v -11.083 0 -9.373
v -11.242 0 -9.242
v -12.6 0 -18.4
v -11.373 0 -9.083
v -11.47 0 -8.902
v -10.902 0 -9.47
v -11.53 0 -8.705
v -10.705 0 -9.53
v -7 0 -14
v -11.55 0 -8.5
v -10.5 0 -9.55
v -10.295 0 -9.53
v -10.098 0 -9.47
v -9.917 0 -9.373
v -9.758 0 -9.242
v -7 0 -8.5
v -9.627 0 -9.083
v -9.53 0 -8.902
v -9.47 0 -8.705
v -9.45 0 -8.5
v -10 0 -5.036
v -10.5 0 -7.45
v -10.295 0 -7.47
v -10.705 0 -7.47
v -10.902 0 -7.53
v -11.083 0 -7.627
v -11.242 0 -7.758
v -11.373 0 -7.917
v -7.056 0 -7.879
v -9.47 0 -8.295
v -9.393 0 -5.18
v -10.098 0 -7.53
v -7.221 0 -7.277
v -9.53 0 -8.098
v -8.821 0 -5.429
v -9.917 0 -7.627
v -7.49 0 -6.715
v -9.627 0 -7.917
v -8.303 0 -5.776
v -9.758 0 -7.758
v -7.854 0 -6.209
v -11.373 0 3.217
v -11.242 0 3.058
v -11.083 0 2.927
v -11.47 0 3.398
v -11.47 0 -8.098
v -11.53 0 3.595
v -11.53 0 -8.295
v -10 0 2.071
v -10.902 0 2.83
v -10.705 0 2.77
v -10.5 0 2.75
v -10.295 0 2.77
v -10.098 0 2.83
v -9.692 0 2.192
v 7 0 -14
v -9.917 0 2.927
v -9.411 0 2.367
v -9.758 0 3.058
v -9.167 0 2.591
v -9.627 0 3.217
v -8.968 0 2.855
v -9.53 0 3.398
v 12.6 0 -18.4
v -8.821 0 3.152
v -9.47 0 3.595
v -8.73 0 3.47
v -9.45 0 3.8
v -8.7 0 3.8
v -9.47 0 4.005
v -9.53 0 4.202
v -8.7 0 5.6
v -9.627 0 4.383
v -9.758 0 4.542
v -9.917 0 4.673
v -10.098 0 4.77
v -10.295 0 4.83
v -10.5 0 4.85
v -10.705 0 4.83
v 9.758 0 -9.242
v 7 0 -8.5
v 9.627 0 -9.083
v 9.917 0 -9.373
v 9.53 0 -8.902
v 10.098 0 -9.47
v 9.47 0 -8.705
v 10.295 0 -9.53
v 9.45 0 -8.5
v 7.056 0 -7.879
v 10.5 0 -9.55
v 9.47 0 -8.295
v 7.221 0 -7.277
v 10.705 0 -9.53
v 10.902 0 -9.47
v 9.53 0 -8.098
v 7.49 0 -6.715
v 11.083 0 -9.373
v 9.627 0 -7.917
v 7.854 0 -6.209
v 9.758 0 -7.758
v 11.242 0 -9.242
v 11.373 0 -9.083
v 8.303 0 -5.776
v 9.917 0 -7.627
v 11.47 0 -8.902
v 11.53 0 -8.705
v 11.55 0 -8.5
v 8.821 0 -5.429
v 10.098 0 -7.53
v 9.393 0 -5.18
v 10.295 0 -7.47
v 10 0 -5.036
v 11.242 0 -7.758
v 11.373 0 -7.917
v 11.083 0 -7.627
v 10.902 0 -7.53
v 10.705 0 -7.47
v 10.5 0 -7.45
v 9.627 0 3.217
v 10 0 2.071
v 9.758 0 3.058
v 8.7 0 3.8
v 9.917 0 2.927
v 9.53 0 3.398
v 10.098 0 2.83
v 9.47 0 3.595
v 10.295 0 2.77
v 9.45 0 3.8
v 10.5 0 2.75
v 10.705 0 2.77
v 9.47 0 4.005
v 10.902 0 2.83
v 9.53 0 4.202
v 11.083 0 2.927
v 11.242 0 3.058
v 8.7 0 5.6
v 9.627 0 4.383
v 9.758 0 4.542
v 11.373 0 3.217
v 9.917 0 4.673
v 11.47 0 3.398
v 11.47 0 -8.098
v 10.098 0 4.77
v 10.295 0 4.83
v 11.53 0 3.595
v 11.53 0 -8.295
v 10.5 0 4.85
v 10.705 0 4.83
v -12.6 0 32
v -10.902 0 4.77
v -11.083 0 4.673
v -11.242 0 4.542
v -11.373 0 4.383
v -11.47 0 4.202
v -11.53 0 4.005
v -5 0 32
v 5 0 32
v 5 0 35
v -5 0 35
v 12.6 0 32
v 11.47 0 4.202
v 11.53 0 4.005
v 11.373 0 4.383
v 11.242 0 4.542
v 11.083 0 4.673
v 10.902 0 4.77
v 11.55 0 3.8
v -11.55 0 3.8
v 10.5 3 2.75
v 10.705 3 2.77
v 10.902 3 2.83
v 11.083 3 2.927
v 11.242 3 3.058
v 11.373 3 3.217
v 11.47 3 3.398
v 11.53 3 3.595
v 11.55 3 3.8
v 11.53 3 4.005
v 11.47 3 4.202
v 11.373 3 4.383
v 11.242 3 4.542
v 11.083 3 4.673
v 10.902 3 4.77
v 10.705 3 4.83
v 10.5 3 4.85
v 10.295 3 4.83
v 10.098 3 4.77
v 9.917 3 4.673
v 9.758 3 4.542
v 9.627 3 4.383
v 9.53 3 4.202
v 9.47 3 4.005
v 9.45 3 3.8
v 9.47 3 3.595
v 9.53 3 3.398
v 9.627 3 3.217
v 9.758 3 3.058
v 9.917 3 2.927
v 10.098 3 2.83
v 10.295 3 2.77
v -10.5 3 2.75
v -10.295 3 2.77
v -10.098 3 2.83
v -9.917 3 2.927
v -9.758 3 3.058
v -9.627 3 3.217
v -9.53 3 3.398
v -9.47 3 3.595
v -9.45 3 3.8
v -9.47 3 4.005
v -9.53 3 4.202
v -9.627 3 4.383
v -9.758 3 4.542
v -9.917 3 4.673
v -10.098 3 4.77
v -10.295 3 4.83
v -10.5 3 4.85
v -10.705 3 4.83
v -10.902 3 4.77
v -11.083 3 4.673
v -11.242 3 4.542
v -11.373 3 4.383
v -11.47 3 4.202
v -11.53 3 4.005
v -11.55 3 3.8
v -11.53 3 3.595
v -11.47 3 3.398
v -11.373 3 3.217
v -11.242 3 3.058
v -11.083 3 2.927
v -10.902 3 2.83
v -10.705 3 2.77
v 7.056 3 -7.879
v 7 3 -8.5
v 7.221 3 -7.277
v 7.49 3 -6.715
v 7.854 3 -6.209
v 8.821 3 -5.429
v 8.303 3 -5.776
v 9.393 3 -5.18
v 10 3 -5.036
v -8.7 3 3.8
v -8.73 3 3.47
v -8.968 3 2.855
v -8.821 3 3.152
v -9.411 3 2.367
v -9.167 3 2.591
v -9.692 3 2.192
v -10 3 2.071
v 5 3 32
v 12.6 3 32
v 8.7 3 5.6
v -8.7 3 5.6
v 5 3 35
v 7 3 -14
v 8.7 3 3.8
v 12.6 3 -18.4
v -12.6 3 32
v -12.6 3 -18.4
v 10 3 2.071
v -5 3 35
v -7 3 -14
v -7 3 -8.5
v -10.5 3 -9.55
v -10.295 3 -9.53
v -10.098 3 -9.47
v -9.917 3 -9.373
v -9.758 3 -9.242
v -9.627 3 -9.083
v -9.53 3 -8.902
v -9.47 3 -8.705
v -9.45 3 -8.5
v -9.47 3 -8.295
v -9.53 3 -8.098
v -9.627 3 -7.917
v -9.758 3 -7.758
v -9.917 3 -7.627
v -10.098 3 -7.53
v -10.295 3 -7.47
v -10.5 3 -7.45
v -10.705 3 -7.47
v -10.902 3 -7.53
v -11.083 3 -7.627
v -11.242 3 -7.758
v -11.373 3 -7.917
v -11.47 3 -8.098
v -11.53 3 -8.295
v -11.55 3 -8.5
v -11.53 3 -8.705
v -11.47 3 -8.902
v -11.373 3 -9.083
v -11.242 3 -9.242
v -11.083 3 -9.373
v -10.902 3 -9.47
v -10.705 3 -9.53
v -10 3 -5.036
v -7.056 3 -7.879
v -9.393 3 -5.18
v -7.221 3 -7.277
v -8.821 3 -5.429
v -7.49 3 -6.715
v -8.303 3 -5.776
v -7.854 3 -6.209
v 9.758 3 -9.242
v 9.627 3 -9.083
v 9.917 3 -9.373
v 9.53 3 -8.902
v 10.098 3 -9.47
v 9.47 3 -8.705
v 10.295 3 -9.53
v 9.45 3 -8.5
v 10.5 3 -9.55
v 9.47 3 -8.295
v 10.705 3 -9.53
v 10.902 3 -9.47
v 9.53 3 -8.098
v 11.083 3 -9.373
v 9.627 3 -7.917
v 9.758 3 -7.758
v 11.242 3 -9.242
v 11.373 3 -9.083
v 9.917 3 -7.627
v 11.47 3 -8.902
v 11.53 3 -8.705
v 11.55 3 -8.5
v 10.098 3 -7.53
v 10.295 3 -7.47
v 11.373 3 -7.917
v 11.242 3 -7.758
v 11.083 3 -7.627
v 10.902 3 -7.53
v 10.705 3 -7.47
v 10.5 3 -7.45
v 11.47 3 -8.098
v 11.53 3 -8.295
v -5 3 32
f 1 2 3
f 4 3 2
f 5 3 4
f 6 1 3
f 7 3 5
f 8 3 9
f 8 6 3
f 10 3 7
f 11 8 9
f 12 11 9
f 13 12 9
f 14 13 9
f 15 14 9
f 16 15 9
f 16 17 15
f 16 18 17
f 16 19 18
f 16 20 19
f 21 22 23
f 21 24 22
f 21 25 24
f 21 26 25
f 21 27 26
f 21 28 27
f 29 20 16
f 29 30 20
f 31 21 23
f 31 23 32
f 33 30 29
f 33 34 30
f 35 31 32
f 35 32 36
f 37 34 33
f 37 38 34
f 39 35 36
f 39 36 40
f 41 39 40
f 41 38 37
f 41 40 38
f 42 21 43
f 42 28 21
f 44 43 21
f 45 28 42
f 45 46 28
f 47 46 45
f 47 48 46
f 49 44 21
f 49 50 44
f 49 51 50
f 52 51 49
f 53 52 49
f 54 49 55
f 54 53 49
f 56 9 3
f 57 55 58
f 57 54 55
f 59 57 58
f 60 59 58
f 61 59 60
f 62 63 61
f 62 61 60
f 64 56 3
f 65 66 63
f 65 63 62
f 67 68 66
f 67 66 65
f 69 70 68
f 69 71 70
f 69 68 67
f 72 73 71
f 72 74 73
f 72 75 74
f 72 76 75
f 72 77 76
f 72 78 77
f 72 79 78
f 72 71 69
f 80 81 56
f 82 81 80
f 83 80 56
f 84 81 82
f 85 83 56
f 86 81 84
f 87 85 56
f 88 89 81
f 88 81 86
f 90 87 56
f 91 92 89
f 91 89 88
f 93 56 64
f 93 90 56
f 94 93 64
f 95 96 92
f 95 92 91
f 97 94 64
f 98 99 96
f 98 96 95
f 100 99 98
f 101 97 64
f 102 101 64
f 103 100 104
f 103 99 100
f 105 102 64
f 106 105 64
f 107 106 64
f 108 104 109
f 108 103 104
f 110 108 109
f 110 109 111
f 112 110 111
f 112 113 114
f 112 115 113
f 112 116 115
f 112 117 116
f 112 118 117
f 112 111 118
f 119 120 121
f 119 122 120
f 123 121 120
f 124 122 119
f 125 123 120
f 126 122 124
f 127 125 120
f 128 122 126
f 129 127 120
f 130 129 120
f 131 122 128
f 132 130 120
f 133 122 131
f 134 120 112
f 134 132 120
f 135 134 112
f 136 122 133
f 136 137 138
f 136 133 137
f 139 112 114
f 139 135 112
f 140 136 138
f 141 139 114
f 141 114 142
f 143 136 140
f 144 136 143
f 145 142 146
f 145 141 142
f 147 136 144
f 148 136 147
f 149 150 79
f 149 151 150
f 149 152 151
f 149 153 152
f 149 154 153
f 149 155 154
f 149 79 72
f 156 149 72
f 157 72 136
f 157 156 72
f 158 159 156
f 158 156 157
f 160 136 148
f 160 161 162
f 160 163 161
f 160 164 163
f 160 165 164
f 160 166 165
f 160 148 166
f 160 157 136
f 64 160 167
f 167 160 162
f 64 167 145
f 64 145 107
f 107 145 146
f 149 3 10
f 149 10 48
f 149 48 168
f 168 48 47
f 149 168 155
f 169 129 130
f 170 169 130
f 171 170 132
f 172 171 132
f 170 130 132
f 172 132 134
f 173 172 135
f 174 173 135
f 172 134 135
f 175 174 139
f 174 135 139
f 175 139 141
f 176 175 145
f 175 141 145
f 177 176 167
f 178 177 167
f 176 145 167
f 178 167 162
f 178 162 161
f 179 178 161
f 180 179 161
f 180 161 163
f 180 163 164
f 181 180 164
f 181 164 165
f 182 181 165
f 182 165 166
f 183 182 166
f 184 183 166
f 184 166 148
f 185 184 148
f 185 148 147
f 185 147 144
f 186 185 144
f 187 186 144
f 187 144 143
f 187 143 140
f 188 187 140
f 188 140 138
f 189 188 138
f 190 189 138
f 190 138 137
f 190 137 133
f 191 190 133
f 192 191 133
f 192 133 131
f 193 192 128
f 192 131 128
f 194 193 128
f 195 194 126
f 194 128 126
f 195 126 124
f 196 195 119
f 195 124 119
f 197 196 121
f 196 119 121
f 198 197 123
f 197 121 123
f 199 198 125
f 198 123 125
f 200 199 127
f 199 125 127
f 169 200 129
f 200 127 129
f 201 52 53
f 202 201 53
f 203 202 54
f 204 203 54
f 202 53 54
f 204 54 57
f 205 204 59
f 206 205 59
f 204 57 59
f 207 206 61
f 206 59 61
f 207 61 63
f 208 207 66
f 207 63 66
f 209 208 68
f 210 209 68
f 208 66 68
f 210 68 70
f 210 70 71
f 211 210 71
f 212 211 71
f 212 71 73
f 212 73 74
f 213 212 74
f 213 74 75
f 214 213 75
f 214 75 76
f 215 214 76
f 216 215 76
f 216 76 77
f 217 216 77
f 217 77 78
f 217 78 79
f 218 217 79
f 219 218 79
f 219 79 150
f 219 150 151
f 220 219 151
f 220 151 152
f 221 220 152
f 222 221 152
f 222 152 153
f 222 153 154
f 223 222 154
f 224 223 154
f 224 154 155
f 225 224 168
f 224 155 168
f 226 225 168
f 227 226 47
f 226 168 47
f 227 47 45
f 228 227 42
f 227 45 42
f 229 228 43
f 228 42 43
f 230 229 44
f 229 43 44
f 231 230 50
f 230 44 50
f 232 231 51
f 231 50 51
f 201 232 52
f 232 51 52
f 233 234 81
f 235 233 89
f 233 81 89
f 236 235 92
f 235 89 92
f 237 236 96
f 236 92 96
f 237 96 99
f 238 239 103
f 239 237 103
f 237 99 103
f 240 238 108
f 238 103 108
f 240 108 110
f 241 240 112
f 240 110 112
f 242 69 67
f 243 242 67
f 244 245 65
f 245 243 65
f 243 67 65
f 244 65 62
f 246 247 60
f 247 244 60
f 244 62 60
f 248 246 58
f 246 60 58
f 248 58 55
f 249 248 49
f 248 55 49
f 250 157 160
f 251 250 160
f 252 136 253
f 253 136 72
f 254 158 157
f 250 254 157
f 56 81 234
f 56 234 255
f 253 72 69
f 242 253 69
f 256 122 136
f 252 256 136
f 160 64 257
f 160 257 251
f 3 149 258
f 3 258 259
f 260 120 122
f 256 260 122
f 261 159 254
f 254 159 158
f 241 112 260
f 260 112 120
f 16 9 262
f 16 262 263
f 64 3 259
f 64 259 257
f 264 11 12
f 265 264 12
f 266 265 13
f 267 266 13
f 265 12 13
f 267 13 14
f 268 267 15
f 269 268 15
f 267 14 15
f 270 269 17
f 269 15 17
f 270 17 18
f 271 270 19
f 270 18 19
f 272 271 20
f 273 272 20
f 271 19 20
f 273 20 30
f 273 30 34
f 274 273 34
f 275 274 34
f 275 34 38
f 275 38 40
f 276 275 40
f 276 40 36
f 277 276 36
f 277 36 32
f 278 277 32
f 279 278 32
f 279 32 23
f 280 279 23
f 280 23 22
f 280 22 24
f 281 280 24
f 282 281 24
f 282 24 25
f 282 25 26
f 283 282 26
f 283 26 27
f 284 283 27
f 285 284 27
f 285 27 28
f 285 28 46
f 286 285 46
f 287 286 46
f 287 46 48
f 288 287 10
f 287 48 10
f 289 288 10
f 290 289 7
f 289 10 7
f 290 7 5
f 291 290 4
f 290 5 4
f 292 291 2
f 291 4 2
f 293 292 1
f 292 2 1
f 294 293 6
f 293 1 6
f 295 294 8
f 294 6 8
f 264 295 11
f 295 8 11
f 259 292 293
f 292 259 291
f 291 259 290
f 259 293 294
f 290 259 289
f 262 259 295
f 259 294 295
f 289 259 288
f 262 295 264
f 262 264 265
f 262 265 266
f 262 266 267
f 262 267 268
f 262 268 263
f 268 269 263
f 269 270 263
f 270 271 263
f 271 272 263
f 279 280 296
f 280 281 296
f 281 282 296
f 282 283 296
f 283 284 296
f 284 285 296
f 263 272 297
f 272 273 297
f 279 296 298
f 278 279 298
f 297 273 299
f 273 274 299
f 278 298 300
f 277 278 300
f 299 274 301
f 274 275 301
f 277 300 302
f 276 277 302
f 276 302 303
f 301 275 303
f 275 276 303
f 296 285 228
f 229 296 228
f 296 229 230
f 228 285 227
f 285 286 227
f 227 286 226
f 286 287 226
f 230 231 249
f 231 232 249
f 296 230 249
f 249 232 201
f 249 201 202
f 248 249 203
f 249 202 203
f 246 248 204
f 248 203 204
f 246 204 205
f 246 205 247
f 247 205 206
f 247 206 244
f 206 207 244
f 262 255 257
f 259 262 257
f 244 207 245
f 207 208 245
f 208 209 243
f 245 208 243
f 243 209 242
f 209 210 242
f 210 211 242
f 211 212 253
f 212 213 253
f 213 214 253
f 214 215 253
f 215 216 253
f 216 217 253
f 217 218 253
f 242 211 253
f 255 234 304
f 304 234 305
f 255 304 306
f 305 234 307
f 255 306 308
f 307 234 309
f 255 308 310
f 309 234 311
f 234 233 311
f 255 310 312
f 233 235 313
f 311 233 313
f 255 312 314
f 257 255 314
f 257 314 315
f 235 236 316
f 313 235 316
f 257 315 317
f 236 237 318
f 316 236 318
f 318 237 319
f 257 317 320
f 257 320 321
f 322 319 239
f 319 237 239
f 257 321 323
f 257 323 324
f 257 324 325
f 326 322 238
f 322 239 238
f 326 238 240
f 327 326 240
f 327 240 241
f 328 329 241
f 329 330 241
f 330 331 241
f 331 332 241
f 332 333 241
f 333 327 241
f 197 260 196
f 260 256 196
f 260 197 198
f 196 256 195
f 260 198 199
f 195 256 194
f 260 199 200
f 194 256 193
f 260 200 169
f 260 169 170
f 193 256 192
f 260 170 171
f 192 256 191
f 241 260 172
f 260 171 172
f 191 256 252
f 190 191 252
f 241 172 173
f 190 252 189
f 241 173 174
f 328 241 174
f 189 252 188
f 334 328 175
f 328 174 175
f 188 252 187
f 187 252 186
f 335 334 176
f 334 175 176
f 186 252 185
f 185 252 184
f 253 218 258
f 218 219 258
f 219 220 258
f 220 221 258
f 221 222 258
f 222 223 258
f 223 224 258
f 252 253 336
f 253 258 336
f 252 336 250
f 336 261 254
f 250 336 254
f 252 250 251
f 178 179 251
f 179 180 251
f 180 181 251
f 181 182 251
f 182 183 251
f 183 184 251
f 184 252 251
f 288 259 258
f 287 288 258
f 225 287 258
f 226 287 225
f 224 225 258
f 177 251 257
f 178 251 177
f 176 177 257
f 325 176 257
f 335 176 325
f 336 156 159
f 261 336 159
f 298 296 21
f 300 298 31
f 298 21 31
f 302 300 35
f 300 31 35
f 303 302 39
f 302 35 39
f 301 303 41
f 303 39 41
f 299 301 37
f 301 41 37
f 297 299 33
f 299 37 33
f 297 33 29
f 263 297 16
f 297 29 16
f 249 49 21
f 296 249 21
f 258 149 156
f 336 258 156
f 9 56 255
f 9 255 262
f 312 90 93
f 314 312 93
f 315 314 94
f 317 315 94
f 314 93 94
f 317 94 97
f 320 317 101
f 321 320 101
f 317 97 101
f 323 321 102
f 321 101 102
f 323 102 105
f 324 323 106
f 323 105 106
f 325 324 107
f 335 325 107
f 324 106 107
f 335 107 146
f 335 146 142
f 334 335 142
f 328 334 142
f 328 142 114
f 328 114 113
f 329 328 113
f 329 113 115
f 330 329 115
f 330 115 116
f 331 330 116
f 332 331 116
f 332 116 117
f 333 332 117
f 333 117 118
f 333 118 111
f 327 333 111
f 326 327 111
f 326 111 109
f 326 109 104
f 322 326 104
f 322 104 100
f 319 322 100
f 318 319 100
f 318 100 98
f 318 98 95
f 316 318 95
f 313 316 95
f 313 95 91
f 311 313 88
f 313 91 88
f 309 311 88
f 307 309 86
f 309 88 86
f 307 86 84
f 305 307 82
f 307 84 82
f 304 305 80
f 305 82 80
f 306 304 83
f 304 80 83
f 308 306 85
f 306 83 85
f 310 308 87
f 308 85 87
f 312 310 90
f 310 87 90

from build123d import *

# Parameters (mm, degrees)
BOSS_EXTRUDE1_DEPTH = 3
SKETCH2_R           = 1.05
CUT_EXTRUDE1_DEPTH  = 10
CUT_EXTRUDE4_DEPTH  = 10
BOSS_EXTRUDE2_DEPTH = 3


with BuildPart() as part:
    # Sketch1 → Boss-Extrude1 (new body)
    with BuildSketch(Plane(origin=(0, 0, 0), x_dir=(1, 0, 0), z_dir=(0, 1, 0))):
        Polygon((-12.6, -12), (-12.6, -32), (-5, -32), (-5, -35), (0, -35), (5, -35), (5, -32), (12.6, -32), (12.6, -12), (12.6, 12), (-12.6, 12), align=None)
    extrude(amount=BOSS_EXTRUDE1_DEPTH)

    # Sketch2 → Cut-Extrude1 (cut)
    with BuildSketch(Plane.XZ):
        with Locations(Location((10.5, -8.5, 0), (0, 0, 270))):
            Circle(SKETCH2_R)
        with Locations(Location((-10.5, -8.5, 0), (0, 0, 270))):
            Circle(SKETCH2_R)
        with Locations(Location((-10.5, 3.8, 0), (0, 0, 270))):
            Circle(SKETCH2_R)
        with Locations(Location((10.5, 3.8, 0), (0, 0, 270))):
            Circle(SKETCH2_R)
    extrude(amount=-CUT_EXTRUDE1_DEPTH, mode=Mode.SUBTRACT)

    # Sketch5 → Cut-Extrude4 (cut)
    with BuildSketch(Plane(origin=(0, 0, 0), x_dir=(-1, 0, 0), z_dir=(0, -1, 0))):
        with BuildLine():
            Line((-10, 5.035898385), (-10, -1.863508327))
            Line((-10, -1.863508327), (-10, -2.070838353))
            Line((-10, -2.070838353), (-8.7, -3.8))
            Line((-8.7, -3.8), (-8.7, -5.6))
            Line((-8.7, -5.6), (8.7, -5.6))
            Line((8.7, -5.6), (8.7, -3.8))
            ThreePointArc((8.7, -3.8), (9.061250543, -2.718334617), (10, -2.070838353))
            Line((10, -2.070838353), (10, -1.863508327))
            Line((10, -1.863508327), (10, 5.035898385))
            ThreePointArc((10, 5.035898385), (7.854248689, 6.208712153), (7, 8.5))
            Line((7, 8.5), (7, 12))
            Line((7, 12), (-7, 12))
            Line((-7, 12), (-7, 8.5))
            ThreePointArc((-7, 8.5), (-7.854248689, 6.208712153), (-10, 5.035898385))
        make_face()
    extrude(amount=-CUT_EXTRUDE4_DEPTH, mode=Mode.SUBTRACT)

    # Sketch6 → Boss-Extrude2 (add)
    with BuildSketch(Plane.XZ):
        Polygon((7, -12), (7, -14), (-7, -14), (-7, -12), (-12.6, -12), (-12.6, -18.4), (12.6, -18.4), (12.6, -12), align=None)
    extrude(amount=-BOSS_EXTRUDE2_DEPTH)


solid = part.part
